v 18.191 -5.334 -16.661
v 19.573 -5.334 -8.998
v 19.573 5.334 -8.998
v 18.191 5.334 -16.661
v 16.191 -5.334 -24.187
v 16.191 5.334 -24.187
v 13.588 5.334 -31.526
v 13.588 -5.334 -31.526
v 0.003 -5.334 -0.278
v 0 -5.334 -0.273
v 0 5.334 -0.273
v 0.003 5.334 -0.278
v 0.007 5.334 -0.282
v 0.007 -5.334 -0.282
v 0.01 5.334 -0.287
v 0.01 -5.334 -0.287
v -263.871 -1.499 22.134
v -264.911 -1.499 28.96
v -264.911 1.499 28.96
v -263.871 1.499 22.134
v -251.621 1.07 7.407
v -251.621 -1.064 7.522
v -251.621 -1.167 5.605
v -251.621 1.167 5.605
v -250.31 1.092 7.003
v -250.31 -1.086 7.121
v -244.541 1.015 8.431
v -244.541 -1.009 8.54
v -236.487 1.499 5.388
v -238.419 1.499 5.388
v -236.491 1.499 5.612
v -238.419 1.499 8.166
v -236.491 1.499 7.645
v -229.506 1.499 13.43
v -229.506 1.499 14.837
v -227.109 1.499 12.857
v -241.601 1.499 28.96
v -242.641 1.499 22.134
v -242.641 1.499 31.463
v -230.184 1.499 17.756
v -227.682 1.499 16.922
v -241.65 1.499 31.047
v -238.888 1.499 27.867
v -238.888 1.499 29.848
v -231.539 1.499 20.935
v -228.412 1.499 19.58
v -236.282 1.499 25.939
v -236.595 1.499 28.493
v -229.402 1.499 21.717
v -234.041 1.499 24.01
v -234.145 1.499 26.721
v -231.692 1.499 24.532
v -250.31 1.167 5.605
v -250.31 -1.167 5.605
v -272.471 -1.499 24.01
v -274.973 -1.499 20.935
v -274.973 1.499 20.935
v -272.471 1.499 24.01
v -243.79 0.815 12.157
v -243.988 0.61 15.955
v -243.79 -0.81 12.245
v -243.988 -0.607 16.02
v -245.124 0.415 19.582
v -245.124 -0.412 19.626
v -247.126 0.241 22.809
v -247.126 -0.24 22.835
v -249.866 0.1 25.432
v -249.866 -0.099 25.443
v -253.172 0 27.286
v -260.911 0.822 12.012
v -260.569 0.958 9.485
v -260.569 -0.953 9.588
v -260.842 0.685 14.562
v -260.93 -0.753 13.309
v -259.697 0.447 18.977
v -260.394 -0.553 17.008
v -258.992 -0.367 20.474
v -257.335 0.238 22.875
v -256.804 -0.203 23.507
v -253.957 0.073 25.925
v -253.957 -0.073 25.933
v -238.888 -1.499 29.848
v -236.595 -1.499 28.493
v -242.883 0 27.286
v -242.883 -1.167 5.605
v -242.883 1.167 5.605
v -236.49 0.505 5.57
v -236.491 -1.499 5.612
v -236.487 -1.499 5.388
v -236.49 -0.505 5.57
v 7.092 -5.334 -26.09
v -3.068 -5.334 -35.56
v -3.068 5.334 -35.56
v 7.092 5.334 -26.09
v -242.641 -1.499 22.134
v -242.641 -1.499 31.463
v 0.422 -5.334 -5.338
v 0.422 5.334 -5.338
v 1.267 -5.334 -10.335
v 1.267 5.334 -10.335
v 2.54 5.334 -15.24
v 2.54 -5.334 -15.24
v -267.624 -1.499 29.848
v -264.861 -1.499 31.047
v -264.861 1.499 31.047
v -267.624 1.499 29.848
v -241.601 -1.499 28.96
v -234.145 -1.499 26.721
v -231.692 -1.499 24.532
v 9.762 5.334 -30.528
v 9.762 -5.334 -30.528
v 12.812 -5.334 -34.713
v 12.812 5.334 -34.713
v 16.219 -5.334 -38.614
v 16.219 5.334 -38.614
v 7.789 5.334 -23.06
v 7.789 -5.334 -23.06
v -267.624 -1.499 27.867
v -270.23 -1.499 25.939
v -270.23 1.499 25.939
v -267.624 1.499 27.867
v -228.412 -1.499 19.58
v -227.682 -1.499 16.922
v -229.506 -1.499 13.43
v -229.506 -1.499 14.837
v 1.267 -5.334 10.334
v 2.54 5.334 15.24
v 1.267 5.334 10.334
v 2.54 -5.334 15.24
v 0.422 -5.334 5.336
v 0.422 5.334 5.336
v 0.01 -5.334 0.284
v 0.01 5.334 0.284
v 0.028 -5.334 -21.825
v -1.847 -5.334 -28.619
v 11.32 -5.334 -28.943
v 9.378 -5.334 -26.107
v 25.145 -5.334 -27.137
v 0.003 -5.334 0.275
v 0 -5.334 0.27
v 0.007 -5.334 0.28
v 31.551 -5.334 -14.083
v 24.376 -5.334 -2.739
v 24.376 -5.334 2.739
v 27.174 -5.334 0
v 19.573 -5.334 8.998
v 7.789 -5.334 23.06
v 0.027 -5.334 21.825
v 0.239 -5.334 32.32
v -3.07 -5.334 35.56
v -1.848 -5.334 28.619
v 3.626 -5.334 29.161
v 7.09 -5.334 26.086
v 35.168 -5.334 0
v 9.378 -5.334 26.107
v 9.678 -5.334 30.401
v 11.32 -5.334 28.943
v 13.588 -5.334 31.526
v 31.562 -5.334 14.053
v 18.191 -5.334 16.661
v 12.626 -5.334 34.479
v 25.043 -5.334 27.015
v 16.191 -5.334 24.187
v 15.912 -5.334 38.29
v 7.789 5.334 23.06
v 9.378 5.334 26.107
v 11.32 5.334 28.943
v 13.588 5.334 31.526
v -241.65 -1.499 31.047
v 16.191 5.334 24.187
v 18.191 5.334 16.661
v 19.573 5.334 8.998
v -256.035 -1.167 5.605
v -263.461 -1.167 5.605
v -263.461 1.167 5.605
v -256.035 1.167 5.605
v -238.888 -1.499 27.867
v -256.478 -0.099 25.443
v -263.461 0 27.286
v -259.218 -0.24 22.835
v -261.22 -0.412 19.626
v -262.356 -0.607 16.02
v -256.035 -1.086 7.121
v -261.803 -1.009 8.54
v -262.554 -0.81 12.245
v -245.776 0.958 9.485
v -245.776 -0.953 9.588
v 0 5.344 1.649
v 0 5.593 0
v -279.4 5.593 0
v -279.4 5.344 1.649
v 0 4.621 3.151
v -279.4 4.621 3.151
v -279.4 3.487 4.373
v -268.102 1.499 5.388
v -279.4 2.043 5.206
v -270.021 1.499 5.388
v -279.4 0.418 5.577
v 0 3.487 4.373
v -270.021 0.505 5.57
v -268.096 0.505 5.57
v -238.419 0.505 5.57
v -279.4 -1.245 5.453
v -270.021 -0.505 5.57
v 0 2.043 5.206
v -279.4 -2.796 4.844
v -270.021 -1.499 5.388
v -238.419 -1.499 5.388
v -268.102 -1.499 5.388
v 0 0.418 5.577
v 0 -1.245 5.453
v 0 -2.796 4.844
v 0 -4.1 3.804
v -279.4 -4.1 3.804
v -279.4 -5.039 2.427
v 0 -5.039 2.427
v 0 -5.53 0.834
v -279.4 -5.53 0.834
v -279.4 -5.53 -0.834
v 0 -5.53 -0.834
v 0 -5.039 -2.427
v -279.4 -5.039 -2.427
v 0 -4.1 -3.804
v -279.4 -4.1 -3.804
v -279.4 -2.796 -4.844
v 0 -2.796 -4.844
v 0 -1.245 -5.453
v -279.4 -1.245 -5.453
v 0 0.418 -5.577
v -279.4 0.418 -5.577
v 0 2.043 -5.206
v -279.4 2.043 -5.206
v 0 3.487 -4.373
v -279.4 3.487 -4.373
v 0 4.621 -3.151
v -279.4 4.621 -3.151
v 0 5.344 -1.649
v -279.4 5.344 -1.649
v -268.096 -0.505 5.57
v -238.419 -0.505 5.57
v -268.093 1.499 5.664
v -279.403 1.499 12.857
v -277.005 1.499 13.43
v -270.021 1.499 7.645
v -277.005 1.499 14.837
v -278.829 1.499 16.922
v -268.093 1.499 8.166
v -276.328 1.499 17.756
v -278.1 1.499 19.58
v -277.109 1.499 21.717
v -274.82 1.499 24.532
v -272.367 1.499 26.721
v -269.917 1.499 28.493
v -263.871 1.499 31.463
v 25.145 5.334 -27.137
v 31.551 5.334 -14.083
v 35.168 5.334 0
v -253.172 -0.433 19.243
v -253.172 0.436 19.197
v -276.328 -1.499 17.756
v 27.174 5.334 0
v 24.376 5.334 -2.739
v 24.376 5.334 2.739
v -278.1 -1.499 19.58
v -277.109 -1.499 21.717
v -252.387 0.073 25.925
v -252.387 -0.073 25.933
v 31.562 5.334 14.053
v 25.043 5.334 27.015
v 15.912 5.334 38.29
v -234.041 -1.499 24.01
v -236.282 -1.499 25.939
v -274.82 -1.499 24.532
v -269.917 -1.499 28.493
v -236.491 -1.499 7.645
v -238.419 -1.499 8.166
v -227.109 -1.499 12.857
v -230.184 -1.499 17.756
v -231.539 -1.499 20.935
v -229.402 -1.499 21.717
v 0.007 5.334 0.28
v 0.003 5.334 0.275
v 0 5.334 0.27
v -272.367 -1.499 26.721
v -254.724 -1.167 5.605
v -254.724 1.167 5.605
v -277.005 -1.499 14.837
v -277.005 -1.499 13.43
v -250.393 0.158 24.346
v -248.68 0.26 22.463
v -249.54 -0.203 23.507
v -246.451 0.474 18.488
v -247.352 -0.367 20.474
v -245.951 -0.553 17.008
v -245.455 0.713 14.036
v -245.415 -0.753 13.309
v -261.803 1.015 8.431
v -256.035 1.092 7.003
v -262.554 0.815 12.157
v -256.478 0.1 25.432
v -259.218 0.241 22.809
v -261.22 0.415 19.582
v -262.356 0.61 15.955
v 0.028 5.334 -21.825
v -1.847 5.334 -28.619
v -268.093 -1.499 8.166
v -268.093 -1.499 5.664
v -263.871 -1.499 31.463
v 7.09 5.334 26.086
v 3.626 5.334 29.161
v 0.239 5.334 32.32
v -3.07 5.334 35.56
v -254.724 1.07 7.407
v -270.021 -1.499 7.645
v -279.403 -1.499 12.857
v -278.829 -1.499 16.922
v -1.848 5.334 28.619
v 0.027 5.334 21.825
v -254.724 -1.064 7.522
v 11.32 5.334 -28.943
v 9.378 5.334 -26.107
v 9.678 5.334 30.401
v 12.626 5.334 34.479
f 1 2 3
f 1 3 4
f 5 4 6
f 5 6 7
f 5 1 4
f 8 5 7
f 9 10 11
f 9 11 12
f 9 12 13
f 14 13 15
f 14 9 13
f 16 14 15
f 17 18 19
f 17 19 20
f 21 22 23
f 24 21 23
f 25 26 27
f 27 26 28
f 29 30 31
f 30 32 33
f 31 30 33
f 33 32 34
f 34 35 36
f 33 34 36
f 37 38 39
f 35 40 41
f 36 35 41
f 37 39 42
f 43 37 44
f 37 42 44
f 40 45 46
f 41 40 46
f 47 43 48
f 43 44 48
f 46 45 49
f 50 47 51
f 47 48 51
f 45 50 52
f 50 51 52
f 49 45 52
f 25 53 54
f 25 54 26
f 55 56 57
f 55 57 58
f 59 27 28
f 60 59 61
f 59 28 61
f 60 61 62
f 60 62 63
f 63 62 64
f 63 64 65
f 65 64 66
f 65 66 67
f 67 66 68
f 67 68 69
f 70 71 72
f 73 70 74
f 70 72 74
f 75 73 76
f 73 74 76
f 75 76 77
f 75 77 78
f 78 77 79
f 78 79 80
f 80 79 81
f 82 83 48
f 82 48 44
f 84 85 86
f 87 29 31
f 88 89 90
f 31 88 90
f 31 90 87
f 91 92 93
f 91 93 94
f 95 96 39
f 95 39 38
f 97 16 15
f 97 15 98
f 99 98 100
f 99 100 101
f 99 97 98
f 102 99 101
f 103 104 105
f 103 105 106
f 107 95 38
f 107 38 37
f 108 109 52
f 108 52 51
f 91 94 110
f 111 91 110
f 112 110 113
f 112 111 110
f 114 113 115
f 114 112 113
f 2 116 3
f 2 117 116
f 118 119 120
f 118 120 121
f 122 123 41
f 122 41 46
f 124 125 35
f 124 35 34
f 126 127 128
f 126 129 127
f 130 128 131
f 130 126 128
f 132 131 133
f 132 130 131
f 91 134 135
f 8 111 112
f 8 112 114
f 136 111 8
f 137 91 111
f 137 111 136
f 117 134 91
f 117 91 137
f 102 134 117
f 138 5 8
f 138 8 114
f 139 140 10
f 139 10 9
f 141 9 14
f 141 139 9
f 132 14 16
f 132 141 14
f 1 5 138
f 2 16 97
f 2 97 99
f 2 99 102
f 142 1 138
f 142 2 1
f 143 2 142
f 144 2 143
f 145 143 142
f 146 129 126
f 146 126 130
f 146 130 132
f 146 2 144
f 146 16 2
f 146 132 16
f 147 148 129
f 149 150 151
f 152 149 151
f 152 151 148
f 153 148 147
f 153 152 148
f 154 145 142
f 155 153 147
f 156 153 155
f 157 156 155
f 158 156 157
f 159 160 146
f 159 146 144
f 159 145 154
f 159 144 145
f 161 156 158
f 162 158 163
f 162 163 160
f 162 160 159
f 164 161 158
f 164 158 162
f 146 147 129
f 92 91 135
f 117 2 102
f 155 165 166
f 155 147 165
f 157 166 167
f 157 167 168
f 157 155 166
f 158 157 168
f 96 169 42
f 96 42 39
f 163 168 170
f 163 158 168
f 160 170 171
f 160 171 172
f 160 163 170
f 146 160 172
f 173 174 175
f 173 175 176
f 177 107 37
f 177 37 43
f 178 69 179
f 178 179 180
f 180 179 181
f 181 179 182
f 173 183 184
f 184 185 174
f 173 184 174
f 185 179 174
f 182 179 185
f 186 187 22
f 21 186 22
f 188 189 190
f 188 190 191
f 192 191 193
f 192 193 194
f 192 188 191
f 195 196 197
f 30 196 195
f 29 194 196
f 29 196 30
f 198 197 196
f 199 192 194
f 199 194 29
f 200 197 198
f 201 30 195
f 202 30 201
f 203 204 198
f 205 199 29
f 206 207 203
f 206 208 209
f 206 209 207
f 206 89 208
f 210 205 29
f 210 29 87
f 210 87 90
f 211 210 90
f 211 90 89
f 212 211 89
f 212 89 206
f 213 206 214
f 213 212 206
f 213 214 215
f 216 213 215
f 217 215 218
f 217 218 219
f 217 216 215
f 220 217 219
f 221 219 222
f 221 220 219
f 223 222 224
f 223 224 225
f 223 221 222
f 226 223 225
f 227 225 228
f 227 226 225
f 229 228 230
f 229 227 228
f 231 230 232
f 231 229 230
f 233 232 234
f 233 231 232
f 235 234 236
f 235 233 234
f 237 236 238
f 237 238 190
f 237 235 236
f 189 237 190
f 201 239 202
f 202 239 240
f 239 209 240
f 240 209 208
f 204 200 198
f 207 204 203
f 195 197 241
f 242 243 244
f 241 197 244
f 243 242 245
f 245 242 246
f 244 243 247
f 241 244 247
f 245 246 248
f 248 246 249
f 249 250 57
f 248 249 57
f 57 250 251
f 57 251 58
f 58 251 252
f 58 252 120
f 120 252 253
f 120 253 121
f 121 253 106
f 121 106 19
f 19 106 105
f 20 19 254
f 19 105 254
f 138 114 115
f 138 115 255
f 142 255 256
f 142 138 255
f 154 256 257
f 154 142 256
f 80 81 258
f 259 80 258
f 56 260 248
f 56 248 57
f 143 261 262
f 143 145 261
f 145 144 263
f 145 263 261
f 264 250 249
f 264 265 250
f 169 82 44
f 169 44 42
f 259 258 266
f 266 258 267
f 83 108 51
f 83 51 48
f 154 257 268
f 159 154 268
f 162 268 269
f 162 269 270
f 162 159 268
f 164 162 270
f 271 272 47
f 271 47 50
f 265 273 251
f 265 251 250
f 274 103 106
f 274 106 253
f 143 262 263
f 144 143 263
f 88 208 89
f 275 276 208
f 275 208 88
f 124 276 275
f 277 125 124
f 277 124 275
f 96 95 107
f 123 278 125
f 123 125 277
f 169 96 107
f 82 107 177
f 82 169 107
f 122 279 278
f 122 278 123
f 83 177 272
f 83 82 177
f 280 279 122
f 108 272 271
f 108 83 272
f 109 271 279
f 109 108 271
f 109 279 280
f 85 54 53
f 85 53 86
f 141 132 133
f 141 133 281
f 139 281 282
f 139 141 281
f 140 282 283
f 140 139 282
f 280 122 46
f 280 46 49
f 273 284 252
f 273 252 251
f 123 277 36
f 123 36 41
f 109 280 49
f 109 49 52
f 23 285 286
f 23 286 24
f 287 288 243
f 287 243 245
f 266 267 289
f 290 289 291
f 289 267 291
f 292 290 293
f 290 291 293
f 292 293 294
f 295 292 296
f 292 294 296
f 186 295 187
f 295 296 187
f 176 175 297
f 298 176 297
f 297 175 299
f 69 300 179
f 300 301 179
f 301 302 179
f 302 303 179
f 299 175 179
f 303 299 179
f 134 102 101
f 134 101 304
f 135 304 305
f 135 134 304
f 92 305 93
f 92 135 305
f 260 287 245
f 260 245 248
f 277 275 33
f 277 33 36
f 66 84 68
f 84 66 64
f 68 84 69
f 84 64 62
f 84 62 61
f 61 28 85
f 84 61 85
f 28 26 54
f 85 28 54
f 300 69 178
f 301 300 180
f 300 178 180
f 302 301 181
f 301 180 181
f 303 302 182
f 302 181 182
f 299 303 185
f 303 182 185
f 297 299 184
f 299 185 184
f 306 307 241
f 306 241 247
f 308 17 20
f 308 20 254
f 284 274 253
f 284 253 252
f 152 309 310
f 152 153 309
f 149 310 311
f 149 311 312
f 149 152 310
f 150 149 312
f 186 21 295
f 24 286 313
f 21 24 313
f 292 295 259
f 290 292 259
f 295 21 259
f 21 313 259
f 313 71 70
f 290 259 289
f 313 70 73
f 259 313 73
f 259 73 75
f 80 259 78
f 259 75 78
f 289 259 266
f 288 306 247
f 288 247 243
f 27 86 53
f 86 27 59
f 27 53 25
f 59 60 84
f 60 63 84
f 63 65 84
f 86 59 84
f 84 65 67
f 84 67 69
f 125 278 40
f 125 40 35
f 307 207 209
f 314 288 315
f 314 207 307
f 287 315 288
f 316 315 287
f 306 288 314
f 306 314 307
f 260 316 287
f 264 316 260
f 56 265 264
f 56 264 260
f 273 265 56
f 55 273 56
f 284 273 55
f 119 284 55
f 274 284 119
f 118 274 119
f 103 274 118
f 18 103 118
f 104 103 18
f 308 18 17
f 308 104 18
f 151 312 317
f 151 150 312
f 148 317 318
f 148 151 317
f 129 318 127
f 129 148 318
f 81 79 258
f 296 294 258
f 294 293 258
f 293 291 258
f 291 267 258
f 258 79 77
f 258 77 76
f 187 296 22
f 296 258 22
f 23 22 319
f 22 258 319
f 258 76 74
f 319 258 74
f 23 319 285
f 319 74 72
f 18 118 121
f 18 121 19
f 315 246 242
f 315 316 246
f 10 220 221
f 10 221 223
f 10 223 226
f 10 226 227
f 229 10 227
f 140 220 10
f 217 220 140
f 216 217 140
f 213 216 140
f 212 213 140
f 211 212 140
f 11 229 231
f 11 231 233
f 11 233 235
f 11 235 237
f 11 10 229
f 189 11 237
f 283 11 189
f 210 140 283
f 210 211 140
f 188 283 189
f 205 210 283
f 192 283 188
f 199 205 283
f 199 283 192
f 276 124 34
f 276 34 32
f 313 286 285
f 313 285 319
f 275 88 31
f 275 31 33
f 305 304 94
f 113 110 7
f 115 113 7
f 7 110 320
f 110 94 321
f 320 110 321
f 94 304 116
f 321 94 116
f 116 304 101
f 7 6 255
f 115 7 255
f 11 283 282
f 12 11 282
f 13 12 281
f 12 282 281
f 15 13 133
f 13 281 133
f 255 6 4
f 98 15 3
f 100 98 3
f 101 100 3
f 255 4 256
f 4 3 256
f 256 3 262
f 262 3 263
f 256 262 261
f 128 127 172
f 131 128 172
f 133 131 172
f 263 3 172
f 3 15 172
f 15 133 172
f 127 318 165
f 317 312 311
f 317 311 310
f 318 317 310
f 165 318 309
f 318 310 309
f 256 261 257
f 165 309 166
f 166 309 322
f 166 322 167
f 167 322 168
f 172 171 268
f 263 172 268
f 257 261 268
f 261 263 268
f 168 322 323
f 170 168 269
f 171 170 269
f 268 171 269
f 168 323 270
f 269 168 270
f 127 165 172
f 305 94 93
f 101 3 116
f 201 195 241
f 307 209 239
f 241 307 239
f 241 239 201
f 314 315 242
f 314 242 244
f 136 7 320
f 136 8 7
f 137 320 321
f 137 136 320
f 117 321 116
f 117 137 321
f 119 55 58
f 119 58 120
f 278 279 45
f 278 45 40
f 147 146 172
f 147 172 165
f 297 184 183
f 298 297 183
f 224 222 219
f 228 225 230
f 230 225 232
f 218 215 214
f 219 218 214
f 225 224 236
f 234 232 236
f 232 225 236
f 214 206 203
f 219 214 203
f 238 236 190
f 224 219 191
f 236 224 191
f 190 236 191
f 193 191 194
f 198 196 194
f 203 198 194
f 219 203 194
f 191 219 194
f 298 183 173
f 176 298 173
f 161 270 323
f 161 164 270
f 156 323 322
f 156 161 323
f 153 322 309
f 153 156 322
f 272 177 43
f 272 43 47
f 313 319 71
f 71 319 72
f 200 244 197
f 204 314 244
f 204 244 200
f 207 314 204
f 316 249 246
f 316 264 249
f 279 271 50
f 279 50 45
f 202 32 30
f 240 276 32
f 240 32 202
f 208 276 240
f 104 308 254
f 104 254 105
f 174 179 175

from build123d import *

# Parameters (mm, degrees)
F0_R        = 5.5929426232
F1_DEPTH    = 279.4
F5_DEPTH    = 1.4986
F6_DEPTH    = 5.334
F7_DEPTH    = 1.778
F8_T1_DEPTH = 192.2731836011
F10_DEPTH   = 12.7


# Not quite as in the source:
# - a fillet or chamfer that OpenCascade refuses, or shapes differently, is made with other operations: its cross-section is extruded or revolved along the edge and cut away or added


with BuildPart() as f1:
    # F0 (on Right) → F1 (new body)
    with BuildSketch(Plane.YZ):
        Circle(F0_R)
    extrude(amount=-F1_DEPTH)

    # F2 (on Front) → F5 (join, symmetric)
    with BuildSketch(Plane.XZ):
        Polygon((-278.8294255733, 16.9219542295), (-279.4027328491, 12.8565793857), (-270.0211107731, 7.6445620507), (-270.0211107731, 5.6118746288), (-270.0211107731, 0), (-236.3921552896, 0), (-236.4905774593, 5.6118746288), (-236.4905774593, 7.6445620507), (-227.1089553833, 12.8565793857), (-227.6822626591, 16.9219542295), (-228.4119427204, 19.5800829679), (-229.402244091, 21.7170100659), (-231.692014207, 24.531500414), (-234.1451644897, 26.7205480486), (-236.594825983, 28.4926332533), (-238.8881146908, 29.8477597535), (-241.6504919529, 31.0465227813), (-242.6407635212, 31.4634852111), (-242.6407635212, 22.1339724958), (-241.6009604931, 28.9600603282), (-238.8881146908, 27.8671924025), (-236.2821102142, 25.9387455881), (-234.0409457684, 24.0102987736), (-231.5391600132, 20.9352076054), (-230.1840484142, 17.7558772266), (-229.5064926147, 14.8371467367), (-229.5064926147, 13.4299015626), (-238.4190261364, 8.1657636911), (-238.4190261364, 5.6639946997), (-238.4190261364, 1.6877186717), (-268.2300508022, 1.6877186717), (-268.092662096, 5.6639946997), (-268.092662096, 8.1657636911), (-277.0051956177, 13.4299015626), (-277.0051956177, 14.8371467367), (-276.3276398182, 17.7558772266), (-274.9725282192, 20.9352076054), (-272.4707424641, 24.0102987736), (-270.2295780182, 25.9387455881), (-267.6235735416, 27.8671924025), (-264.9107277393, 28.9600603282), (-263.8709247112, 22.1339724958), (-263.8709247112, 31.4634852111), (-264.8611962795, 31.0465227813), (-267.6235735416, 29.8477597535), (-269.9168622494, 28.4926332533), (-272.3665237427, 26.7205480486), (-274.8196740255, 24.531500414), (-277.1094441414, 21.7170100659), (-278.099745512, 19.5800829679), align=None)
    extrude(amount=F5_DEPTH, both=True)

    # F3 (on Front) → F6 (join, symmetric)
    with BuildSketch(Plane.XZ):
        with BuildLine():
            ThreePointArc((0.0101553228, 0.2840123077), (-0.0967004528, 0.1418930692), (-0.2038563749, 0))
            Line((-0.2038563749, 0), (0, 0))
            ThreePointArc((0, 0), (0.0049059903, 0.1420122922), (0.0101553228, 0.2840123077))
        make_face()
        with BuildLine():
            Line((0, 0), (-0.2038563749, 0))
            ThreePointArc((-0.2038563749, 0), (-0.0966486695, -0.1433570013), (0.0102668641, -0.2869320359))
            ThreePointArc((0.0102668641, -0.2869320359), (0.004958213, -0.1434722876), (0, 0))
        make_face()
        with BuildLine():
            ThreePointArc((0.0101553228, 0.2840123077), (0.0049059903, 0.1420122922), (0, 0))
            ThreePointArc((0, 0), (0.004958213, -0.1434722876), (0.0102668641, -0.2869320359))
            ThreePointArc((0.0102668641, -0.2869320359), (0.7907915752, -7.8454061019), (2.54, -15.24))
            Line((2.54, -15.24), (2.54, 15.24))
            ThreePointArc((2.54, 15.24), (0.7905478985, 7.8439656383), (0.0101553228, 0.2840123077))
        make_face()
        with BuildLine():
            Line((2.54, 15.24), (2.54, -15.24))
            ThreePointArc((2.54, -15.24), (4.5439363149, -20.7794421559), (7.0923387837, -26.0904519478))
            ThreePointArc((7.0923387837, -26.0904519478), (11.2408564011, -32.6543576843), (16.2185082823, -38.6140589091))
            Line((16.2185082823, -38.6140589091), (23.6472193128, -6.1149669525))
            Line((23.6472193128, -6.1149669525), (19.8538427248, 0))
            Line((19.8538427248, 0), (23.928701104, 5.9311091676))
            Line((23.928701104, 5.9311091676), (15.9117437896, 38.290112876))
            ThreePointArc((15.9117437896, 38.290112876), (11.1082726784, 32.4716804641), (7.0898126318, 26.0858))
            ThreePointArc((7.0898126318, 26.0858), (4.5429123731, 20.7770014472), (2.54, 15.24))
        make_face()
        with BuildLine():
            ThreePointArc((19.5732042193, -8.9976880699), (17.2672693148, -20.4441869398), (13.5875111446, -31.5256603062))
            ThreePointArc((13.5875111446, -31.5256603062), (10.3065645811, -27.5541885084), (7.7893436652, -23.0596587829))
            Line((7.7893436652, -23.0596587829), (19.5732042193, -8.9976880699))
        make_face(mode=Mode.SUBTRACT)
        with BuildLine():
            Line((19.5732042193, 8.9976880699), (7.7893436652, 23.0596587829))
            ThreePointArc((7.7893436652, 23.0596587829), (10.3065645811, 27.5541885084), (13.5875111446, 31.5256603062))
            ThreePointArc((13.5875111446, 31.5256603062), (17.2672693148, 20.4441869398), (19.5732042193, 8.9976880699))
        make_face(mode=Mode.SUBTRACT)
        with BuildLine():
            ThreePointArc((7.0923387837, -26.0904519478), (4.5439363149, -20.7794421559), (2.54, -15.24))
            ThreePointArc((2.54, -15.24), (-0.9901478251, -25.1995599957), (-3.0676612163, -35.56))
            Line((-3.0676612163, -35.56), (7.0923387837, -26.0904519478))
        make_face()
        with BuildLine():
            ThreePointArc((-3.0701873682, 35.56), (-0.9914342988, 25.1994632411), (2.54, 15.24))
            ThreePointArc((2.54, 15.24), (4.5429123731, 20.7770014472), (7.0898126318, 26.0858))
            ThreePointArc((7.0898126318, 26.0858), (1.9231383714, 30.7299517315), (-3.0701873682, 35.56))
        make_face()
        with BuildLine():
            Line((23.6472193128, -6.1149669525), (16.2185082823, -38.6140589091))
            ThreePointArc((16.2185082823, -38.6140589091), (28.6827408005, -20.7741612342), (35.1675897837, 0))
            ThreePointArc((35.1675897837, 0), (28.6506436465, 20.709546245), (15.9117437896, 38.290112876))
            Line((15.9117437896, 38.290112876), (23.928701104, 5.9311091676))
            Line((23.928701104, 5.9311091676), (19.8538427248, 0))
            Line((19.8538427248, 0), (23.6472193128, -6.1149669525))
        make_face()
        Polygon((24.3763010949, 2.7386606671), (27.1741487086, 0), (24.3763010949, -2.7386606671), align=None, mode=Mode.SUBTRACT)
    extrude(amount=F6_DEPTH, both=True)


with BuildPart() as f7:
    # F4 (on Front) → F7 (new body, symmetric)
    with BuildSketch(Plane.XZ):
        Polygon((-263.461381197, 22.2413148731), (-263.461381197, 5.6046764366), (-243.5538172722, 5.6046764366), (-242.8830116987, 5.6046764366), (-242.8830116987, 27.2857323289), (-263.461381197, 27.2857323289), align=None)
    extrude(amount=F7_DEPTH, both=True)

    # F8: chamfer of 1.778 x 33.02 on 2 edges, made by hand

    # F8_s2 → F8_t1 (cut)
    with BuildSketch(Plane.YZ.offset(-349.3087882484)):
        Polygon((0, 27.2857323289), (-1.778, -5.7342676711), (-1.778, 27.2857323289), align=None)
        Polygon((1.778, -5.7342676711), (0, 27.2857323289), (1.778, 27.2857323289), align=None)
    extrude(amount=F8_T1_DEPTH, mode=Mode.SUBTRACT)

    # F9 (on face) → F10 (cut, symmetric)
    with BuildSketch(Plane(origin=(0, -1.4649841536, 0.0788837621), x_dir=(1, 0, 0), z_dir=(0, -0.9985534407, 0.0537682622))):
        with BuildLine():
            Line((-253.9569606738, 25.8916511639), (-253.1721964478, 19.1923287956))
            Line((-253.1721964478, 19.1923287956), (-253.1721964478, 27.2462618997))
            ThreePointArc((-253.1721964478, 27.2462618997), (-261.2199041562, 19.5756184054), (-261.8029889563, 8.4731689868))
            Line((-261.8029889563, 8.4731689868), (-256.0348063707, 7.0519491145))
            Line((-256.0348063707, 7.0519491145), (-256.0348063707, 5.5337976408))
            Line((-256.0348063707, 5.5337976408), (-254.723623395, 5.5337976408))
            Line((-254.723623395, 5.5337976408), (-254.723623395, 7.4541432704))
            Line((-254.723623395, 7.4541432704), (-260.5685285915, 9.5231209762))
            ThreePointArc((-260.5685285915, 9.5231209762), (-259.7972246978, 18.731111896), (-253.9569606738, 25.8916511639))
        make_face()
        with BuildLine():
            Line((-251.6207695007, 7.4541432704), (-251.6207695007, 5.5337976408))
            Line((-251.6207695007, 5.5337976408), (-250.309586525, 5.5337976408))
            Line((-250.309586525, 5.5337976408), (-250.309586525, 7.0519491145))
            Line((-250.309586525, 7.0519491145), (-244.5414039394, 8.4731689868))
            ThreePointArc((-244.5414039394, 8.4731689868), (-245.1244887395, 19.5756184054), (-253.1721964478, 27.2462618997))
            Line((-253.1721964478, 27.2462618997), (-253.1721964478, 19.1923287956))
            Line((-253.1721964478, 19.1923287956), (-252.3874322219, 25.8916511639))
            ThreePointArc((-252.3874322219, 25.8916511639), (-246.5471681979, 18.731111896), (-245.7758643042, 9.5231209762))
            Line((-245.7758643042, 9.5231209762), (-251.6207695007, 7.4541432704))
        make_face()
    extrude(amount=F10_DEPTH, both=True, mode=Mode.SUBTRACT)


solid = Compound([f1.part, f7.part])
